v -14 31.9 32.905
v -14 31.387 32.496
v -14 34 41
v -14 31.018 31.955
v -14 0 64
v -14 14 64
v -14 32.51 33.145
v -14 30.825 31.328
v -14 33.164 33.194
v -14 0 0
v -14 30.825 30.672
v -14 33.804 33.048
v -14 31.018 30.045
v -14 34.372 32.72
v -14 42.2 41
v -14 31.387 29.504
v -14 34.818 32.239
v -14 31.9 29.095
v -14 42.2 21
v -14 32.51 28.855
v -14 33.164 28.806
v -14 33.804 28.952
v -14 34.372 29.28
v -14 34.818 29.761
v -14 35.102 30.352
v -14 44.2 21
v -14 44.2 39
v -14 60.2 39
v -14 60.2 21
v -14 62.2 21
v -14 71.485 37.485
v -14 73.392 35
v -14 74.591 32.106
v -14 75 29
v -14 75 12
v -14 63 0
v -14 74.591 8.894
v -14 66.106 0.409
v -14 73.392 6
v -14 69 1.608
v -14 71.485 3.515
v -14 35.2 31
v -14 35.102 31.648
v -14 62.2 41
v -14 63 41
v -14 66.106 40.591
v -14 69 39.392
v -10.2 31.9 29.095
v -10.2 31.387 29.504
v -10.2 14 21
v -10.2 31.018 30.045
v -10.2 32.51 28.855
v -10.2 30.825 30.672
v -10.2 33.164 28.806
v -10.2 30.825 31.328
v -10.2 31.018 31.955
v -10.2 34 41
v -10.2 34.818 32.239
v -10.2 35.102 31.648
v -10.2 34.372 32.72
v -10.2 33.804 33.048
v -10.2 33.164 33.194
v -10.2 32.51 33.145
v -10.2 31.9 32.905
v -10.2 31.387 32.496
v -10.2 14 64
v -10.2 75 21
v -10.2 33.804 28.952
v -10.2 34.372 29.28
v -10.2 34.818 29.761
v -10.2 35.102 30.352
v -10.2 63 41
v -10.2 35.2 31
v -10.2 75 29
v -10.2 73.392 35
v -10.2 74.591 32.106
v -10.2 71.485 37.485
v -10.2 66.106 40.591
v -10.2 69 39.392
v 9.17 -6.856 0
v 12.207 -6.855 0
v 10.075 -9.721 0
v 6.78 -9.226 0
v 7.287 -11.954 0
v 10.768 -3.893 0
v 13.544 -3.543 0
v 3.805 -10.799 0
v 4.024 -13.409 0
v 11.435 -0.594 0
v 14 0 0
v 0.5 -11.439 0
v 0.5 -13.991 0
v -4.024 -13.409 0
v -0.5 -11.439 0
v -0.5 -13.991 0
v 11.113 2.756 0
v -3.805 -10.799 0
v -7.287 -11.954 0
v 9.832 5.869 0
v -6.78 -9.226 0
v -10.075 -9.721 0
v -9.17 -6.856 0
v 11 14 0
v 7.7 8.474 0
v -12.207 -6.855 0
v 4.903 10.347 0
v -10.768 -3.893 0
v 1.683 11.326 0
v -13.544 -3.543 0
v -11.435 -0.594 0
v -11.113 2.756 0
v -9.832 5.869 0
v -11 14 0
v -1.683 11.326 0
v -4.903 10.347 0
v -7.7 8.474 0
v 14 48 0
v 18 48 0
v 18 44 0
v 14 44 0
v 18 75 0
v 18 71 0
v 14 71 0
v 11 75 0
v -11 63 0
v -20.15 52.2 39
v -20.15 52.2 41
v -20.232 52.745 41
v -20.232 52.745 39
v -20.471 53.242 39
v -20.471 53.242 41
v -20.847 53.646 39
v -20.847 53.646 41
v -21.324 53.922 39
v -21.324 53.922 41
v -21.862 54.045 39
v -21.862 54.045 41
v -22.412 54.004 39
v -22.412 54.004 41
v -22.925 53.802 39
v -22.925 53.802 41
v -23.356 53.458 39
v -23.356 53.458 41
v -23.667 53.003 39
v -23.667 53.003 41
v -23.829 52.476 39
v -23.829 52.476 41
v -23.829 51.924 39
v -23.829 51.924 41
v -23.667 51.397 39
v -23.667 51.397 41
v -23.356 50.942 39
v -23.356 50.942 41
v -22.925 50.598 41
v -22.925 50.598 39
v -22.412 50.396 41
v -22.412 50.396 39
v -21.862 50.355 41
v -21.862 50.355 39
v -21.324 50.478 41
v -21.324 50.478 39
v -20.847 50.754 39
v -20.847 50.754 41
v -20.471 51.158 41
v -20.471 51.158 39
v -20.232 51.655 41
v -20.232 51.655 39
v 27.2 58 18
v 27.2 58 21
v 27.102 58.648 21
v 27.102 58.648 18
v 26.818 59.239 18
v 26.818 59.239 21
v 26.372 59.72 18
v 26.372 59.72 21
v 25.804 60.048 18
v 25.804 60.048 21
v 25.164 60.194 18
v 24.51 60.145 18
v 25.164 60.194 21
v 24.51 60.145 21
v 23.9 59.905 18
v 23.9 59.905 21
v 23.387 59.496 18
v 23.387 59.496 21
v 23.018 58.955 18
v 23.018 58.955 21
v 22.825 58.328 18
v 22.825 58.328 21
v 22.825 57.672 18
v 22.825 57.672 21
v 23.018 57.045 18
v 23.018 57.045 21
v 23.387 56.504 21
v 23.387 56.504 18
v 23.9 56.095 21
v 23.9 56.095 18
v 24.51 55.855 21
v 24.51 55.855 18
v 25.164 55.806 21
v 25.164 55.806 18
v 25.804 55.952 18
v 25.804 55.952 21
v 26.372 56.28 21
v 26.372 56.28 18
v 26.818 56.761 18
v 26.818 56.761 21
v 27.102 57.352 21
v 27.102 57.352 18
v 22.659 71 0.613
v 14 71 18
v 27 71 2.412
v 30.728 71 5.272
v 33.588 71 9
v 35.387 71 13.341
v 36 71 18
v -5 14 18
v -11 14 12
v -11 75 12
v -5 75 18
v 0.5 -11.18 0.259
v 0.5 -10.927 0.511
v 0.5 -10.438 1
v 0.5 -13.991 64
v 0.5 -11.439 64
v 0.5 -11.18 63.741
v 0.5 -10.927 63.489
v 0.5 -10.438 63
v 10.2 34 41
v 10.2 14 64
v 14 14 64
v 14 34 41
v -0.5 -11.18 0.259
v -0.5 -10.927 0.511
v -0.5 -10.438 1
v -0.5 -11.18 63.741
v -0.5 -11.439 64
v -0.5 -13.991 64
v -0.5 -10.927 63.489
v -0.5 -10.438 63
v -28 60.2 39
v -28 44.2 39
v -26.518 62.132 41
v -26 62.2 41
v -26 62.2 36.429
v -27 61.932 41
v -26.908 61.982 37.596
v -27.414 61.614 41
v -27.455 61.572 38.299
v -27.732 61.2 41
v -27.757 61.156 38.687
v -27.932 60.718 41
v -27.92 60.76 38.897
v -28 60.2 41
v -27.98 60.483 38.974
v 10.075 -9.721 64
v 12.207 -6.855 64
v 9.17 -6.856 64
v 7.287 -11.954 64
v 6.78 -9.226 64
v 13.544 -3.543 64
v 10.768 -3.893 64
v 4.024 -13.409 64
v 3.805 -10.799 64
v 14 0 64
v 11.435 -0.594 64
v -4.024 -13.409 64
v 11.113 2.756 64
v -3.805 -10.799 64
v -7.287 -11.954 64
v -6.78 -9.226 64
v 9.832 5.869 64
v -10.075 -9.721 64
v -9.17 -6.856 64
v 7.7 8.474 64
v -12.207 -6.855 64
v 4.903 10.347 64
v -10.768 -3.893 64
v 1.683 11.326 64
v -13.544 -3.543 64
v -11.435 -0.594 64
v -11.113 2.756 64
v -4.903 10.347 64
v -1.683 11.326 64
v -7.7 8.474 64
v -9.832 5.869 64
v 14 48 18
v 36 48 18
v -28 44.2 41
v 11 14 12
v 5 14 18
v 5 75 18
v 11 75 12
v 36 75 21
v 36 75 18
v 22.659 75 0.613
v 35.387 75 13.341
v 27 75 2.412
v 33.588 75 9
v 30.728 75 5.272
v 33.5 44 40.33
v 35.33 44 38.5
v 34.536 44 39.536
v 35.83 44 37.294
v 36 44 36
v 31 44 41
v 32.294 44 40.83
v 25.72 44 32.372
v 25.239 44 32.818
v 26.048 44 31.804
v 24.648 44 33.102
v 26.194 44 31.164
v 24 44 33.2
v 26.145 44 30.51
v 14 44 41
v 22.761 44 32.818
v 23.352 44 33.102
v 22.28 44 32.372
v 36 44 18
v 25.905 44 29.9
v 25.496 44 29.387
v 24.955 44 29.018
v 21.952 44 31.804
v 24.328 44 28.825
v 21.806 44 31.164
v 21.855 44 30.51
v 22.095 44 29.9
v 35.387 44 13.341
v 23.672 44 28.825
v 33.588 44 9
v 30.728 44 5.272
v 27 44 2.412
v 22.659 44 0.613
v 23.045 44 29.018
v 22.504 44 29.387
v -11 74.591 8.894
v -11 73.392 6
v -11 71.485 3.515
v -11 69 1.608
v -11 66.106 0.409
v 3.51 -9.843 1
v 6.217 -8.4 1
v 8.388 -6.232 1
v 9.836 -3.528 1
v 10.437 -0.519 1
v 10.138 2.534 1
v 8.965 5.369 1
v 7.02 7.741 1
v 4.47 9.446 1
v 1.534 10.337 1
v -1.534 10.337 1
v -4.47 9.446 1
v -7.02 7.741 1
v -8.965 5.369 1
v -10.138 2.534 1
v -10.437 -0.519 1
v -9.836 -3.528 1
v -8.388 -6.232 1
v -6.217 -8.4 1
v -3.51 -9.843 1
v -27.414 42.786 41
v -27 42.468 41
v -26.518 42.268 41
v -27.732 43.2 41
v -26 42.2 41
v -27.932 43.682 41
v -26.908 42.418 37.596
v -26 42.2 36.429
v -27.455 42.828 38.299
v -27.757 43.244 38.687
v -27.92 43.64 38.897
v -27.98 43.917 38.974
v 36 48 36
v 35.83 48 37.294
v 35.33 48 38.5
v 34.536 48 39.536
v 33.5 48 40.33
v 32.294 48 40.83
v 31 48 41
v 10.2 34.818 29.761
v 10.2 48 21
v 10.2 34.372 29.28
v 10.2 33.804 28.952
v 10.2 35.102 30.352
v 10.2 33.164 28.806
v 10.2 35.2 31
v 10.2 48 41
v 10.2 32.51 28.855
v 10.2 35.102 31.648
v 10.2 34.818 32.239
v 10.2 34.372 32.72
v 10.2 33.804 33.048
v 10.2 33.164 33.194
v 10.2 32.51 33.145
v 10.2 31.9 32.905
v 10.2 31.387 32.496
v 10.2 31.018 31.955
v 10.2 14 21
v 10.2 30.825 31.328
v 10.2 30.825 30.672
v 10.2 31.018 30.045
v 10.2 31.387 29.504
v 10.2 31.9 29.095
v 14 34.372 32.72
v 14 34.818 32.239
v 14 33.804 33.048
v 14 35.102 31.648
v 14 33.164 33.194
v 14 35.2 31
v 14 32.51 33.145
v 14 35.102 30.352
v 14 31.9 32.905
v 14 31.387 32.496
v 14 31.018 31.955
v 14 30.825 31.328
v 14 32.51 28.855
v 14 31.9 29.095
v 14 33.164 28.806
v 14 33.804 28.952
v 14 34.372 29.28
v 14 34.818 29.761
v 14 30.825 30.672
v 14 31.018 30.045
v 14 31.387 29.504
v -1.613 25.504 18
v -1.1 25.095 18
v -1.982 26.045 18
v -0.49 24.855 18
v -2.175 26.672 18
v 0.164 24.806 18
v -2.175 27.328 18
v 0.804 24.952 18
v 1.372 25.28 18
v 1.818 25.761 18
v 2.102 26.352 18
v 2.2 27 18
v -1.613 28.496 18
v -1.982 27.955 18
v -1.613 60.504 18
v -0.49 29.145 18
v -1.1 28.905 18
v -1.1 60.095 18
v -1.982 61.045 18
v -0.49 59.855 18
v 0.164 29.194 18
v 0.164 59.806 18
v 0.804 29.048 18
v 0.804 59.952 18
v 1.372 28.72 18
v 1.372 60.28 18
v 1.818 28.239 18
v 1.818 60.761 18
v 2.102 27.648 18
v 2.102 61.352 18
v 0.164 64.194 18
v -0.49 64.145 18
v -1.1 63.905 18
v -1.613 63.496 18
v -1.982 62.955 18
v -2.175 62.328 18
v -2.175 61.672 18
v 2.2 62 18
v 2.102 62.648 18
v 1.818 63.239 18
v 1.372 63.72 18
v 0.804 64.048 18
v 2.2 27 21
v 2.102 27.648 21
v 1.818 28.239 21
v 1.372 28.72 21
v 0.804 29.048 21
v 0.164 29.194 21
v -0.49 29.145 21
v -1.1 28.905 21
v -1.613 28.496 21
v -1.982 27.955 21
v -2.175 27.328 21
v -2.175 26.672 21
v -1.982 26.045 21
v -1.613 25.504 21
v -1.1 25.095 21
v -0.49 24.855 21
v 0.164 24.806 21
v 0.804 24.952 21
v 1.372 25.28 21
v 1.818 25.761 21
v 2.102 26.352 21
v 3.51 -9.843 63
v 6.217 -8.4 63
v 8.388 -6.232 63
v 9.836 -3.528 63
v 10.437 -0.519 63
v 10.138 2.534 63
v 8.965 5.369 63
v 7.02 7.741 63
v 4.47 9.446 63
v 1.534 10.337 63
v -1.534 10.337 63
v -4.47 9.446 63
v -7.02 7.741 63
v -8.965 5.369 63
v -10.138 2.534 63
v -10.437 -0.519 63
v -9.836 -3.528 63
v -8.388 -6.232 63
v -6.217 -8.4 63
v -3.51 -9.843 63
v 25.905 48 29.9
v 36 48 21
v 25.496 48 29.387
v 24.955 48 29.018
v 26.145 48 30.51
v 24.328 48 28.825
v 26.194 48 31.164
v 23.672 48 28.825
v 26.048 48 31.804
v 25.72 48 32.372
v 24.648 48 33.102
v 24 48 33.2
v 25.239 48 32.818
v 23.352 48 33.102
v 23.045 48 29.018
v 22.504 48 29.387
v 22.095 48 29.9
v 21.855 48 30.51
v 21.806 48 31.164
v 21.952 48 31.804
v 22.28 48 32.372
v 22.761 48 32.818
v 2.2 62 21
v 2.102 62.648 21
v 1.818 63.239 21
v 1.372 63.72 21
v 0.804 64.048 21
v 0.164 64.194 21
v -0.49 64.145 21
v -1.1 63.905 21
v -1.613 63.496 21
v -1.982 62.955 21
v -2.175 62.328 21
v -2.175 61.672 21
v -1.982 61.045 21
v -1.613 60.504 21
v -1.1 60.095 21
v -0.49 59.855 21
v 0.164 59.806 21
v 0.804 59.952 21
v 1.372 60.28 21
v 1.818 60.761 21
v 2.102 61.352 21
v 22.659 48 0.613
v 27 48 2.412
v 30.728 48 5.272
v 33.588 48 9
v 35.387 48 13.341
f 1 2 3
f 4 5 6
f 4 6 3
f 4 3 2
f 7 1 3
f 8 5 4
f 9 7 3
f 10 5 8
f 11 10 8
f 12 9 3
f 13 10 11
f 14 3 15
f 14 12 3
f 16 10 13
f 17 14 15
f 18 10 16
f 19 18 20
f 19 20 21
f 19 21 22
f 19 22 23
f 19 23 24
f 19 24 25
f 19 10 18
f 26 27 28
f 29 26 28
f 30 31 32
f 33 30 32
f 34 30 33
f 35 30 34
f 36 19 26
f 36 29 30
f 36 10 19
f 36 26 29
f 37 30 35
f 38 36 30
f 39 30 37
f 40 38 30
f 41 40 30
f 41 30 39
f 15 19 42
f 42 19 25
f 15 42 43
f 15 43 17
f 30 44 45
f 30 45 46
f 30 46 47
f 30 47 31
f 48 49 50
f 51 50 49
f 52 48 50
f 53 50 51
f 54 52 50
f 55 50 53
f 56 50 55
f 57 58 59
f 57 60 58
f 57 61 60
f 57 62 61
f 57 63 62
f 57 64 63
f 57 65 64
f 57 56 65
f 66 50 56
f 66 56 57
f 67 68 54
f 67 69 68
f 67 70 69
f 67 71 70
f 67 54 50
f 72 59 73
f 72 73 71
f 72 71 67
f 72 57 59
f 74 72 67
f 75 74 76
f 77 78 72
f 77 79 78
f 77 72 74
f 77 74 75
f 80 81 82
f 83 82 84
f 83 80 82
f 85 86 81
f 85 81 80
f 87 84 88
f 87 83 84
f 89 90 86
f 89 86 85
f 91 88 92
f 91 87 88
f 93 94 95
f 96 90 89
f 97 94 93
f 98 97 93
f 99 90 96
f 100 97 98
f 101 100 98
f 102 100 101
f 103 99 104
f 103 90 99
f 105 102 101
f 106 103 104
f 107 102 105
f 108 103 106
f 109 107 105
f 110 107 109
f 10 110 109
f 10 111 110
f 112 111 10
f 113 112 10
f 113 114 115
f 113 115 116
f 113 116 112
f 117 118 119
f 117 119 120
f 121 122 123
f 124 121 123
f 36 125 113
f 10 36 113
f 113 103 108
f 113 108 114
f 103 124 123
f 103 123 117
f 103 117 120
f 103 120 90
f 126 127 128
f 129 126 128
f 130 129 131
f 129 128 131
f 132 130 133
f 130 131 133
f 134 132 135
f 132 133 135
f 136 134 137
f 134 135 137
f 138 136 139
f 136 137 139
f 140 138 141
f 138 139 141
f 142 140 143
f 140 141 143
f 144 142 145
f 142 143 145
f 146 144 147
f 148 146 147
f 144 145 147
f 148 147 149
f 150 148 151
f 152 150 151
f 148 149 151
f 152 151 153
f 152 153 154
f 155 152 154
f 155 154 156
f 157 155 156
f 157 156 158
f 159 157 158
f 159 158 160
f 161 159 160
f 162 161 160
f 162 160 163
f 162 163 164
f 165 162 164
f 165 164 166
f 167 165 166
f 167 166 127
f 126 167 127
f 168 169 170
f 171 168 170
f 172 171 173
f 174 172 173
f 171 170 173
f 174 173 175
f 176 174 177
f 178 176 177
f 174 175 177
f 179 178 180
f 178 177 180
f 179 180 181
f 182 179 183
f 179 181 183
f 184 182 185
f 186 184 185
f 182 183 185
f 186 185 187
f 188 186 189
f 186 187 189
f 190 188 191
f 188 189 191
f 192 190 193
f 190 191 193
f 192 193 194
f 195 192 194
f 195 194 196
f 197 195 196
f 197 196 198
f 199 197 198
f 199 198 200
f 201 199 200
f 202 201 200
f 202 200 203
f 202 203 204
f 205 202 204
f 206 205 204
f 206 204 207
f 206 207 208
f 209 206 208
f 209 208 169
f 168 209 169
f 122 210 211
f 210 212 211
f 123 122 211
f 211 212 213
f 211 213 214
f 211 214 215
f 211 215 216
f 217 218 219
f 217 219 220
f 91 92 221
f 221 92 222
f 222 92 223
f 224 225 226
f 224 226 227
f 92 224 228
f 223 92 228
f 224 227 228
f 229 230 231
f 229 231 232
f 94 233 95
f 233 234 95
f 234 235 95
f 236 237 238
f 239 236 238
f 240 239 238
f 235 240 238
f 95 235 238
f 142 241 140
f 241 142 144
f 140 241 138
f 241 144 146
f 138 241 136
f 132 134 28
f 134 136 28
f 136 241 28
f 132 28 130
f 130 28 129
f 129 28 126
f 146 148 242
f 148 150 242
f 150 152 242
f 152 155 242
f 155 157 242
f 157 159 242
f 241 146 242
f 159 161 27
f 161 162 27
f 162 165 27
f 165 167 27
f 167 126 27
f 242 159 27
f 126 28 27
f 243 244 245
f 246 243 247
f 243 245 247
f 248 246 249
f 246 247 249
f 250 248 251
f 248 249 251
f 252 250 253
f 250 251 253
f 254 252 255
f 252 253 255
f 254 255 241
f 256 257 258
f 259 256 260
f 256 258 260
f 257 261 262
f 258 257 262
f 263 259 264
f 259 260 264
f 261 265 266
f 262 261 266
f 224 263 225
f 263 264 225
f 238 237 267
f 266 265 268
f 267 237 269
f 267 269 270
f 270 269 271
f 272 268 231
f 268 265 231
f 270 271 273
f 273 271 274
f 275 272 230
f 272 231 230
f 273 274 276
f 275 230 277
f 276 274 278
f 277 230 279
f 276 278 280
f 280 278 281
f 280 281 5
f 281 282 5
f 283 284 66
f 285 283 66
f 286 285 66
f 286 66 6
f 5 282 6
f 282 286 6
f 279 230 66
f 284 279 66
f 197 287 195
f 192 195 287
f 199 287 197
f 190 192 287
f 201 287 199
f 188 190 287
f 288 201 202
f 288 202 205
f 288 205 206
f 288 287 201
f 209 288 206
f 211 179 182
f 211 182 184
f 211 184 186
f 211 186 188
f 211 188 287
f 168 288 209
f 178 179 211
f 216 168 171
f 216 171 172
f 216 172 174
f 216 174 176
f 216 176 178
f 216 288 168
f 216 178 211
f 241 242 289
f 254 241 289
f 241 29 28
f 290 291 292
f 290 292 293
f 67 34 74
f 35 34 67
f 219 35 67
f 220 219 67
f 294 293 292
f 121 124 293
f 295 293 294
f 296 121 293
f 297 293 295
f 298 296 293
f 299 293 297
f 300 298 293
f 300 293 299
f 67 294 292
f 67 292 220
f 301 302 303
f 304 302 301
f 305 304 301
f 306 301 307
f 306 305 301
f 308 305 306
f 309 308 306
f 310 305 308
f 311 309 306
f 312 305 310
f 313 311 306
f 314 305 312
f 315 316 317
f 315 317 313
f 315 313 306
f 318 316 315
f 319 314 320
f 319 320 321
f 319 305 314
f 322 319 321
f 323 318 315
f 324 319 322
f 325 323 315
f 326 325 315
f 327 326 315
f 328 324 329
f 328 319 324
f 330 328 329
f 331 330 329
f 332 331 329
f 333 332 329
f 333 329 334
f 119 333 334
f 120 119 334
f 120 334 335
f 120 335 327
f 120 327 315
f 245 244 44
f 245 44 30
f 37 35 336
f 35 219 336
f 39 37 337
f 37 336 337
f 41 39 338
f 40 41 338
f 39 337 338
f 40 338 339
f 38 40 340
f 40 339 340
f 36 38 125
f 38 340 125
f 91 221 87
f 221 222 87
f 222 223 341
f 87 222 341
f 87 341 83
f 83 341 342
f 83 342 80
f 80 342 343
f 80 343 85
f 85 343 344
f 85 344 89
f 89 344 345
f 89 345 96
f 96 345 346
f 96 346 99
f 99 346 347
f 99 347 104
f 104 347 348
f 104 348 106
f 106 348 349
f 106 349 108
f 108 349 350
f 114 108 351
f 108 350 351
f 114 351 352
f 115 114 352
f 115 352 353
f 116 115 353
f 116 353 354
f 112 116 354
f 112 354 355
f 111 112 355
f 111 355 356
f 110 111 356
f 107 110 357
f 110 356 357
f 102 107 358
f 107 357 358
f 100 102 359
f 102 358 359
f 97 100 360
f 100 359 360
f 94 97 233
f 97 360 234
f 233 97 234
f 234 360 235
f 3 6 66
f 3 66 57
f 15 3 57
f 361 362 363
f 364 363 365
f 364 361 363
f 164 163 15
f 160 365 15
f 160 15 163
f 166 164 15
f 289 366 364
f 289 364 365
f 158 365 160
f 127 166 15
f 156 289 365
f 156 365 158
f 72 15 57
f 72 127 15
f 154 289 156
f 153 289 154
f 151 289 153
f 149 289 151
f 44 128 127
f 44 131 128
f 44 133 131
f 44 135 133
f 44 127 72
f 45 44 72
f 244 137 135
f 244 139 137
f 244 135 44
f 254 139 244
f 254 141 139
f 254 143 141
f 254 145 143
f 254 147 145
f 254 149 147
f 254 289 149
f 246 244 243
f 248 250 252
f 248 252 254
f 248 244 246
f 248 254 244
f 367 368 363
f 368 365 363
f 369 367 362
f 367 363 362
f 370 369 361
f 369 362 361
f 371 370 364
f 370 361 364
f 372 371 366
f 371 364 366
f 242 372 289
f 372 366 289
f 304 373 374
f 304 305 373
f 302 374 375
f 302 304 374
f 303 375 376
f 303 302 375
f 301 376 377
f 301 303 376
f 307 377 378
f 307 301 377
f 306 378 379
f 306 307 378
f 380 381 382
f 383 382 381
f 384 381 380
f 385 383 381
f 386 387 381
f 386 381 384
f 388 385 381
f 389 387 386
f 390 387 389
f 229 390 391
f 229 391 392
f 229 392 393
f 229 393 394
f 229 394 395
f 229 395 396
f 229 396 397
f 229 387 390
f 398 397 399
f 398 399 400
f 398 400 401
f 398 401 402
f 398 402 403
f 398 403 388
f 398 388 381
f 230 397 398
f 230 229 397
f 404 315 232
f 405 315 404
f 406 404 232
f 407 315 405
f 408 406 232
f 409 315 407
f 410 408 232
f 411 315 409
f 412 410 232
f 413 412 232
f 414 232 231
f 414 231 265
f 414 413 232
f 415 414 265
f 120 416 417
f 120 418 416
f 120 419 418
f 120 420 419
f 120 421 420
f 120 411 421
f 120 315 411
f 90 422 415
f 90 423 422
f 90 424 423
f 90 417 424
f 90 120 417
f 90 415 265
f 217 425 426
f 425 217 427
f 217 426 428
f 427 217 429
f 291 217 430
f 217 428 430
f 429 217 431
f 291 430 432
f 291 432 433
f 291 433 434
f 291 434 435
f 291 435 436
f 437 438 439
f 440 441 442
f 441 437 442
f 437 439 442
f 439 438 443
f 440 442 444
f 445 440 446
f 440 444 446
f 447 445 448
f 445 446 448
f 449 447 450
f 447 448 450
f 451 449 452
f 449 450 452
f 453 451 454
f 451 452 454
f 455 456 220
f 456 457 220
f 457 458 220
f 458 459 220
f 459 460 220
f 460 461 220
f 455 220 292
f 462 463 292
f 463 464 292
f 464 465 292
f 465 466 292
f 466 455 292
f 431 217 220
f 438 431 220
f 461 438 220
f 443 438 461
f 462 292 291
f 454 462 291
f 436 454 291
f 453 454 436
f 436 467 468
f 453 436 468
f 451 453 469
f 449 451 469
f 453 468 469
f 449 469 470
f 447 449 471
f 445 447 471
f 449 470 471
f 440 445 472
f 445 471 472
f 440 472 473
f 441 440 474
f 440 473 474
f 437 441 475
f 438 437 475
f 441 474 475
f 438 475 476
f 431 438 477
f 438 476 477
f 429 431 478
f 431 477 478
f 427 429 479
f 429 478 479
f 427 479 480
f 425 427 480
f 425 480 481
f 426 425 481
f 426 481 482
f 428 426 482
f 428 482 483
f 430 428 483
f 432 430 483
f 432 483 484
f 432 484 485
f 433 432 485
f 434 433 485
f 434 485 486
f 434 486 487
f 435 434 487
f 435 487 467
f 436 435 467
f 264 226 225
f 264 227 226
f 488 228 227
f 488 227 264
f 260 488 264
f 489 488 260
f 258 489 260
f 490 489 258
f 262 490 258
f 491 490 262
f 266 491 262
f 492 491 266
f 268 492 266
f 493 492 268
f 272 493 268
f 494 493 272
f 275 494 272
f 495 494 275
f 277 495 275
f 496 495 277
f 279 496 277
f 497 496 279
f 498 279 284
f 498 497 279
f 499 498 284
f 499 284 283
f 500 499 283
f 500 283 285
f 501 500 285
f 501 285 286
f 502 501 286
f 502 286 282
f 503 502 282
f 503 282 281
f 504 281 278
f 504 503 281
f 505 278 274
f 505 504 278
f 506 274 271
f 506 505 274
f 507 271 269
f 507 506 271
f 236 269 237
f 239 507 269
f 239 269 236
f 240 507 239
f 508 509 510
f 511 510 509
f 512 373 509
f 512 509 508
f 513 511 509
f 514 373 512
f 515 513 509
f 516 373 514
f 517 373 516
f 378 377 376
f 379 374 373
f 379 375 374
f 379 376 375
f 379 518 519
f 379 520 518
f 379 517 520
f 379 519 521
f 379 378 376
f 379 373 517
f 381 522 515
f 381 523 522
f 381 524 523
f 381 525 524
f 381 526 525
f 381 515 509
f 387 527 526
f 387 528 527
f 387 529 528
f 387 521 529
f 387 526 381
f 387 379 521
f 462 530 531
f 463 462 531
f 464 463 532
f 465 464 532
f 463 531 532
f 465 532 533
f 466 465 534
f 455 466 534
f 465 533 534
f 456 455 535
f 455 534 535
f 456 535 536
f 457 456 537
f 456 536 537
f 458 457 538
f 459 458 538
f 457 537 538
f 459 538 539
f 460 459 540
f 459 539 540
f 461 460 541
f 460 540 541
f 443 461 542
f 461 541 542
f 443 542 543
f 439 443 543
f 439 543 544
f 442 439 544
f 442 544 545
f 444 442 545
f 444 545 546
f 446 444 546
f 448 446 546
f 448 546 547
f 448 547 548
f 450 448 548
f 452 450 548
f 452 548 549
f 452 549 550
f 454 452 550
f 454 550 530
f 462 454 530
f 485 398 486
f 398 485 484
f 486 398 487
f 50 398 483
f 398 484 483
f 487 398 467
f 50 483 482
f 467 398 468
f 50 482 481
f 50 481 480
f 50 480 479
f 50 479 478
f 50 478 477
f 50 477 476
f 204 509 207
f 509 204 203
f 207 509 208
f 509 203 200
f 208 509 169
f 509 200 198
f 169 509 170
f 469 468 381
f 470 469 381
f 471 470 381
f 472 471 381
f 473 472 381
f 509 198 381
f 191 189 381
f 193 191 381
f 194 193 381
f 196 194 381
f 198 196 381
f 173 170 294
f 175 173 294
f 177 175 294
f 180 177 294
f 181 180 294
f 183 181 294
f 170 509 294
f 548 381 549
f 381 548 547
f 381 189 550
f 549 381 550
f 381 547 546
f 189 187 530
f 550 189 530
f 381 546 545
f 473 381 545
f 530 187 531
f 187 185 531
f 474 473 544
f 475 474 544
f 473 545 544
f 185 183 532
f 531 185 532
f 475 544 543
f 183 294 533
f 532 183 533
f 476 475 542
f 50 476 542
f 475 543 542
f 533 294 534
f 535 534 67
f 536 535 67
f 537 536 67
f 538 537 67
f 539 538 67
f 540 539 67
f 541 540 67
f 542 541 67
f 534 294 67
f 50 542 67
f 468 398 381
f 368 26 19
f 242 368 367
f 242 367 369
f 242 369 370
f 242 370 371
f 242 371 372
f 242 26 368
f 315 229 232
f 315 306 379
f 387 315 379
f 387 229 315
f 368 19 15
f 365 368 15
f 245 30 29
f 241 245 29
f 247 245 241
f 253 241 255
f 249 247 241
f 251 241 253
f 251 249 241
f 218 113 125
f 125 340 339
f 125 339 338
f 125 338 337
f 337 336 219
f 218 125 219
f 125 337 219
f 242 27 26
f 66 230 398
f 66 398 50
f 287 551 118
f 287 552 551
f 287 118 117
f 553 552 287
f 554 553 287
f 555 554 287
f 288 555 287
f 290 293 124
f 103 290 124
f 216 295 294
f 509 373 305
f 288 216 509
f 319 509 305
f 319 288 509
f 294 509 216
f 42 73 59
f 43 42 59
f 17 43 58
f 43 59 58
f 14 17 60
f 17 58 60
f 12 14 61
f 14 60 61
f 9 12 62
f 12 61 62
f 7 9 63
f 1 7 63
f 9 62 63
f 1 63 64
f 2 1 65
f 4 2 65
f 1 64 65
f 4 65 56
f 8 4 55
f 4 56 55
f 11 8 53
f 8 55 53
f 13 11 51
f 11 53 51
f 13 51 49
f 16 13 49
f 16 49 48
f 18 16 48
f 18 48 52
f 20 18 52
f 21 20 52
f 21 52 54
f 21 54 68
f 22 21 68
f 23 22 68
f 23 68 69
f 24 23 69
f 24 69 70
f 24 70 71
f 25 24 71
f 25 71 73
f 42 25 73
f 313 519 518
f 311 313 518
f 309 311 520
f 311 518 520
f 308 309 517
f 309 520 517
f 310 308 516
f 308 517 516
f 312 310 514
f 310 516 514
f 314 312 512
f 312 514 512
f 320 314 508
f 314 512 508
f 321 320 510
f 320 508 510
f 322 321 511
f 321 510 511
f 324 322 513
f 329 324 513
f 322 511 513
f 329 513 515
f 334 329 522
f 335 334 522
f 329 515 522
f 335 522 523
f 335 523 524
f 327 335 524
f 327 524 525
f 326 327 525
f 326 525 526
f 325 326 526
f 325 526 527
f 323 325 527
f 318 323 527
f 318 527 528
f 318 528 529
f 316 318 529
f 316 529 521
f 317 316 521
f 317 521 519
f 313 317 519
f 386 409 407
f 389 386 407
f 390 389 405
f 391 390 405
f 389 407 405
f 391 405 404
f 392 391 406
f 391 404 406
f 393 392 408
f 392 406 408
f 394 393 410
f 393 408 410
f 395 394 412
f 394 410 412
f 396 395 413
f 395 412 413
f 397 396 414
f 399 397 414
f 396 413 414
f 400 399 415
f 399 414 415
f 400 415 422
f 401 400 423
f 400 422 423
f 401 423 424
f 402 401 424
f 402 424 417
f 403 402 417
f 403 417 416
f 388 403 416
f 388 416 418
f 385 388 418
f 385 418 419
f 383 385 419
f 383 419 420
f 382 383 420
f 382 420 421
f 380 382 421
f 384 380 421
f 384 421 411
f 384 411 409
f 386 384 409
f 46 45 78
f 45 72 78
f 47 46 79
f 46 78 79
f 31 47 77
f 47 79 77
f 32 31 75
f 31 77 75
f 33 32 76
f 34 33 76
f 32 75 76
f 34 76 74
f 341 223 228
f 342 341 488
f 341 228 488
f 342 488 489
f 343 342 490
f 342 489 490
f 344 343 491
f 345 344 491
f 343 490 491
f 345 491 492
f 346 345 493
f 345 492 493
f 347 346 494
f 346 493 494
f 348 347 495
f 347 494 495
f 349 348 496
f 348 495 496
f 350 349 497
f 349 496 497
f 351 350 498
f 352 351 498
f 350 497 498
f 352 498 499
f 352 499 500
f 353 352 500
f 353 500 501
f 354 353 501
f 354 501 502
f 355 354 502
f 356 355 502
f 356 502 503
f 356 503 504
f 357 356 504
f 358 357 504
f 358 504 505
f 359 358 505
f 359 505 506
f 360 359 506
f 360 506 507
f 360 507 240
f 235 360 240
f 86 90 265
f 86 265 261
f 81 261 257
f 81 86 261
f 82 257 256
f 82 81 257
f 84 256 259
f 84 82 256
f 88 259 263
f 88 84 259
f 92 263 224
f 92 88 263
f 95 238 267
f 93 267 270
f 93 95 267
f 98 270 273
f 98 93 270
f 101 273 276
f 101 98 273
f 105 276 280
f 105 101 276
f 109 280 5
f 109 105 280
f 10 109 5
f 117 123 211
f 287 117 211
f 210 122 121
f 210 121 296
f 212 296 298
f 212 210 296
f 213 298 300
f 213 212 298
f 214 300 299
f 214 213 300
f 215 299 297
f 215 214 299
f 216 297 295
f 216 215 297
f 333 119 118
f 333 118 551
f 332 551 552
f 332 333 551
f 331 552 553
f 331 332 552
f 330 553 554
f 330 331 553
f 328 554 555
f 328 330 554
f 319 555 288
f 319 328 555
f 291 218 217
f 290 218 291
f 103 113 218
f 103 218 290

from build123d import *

# Parameters (mm, degrees)
BOSS_EXTRUDE1_DEPTH     = 64
CUT_EXTRUDE1_DEPTH      = 61
CUT_EXTRUDE2_DEPTH      = 103.493902258
CUT_EXTRUDE2_DEPTH_BACK = 103.493902258
CUT_EXTRUDE3_DEPTH      = 43
CUT_EXTRUDE4_DEPTH      = 105.961897849
CHAMFER1_SIZE           = 1
SKETCH6_R               = 2.2
CUT_EXTRUDE5_DEPTH      = 94.648278148
BOSS_EXTRUDE2_DEPTH     = 14
CUT_EXTRUDE6_DEPTH      = 106.81625079
SKETCH9_R               = 1.85
CUT_EXTRUDE7_DEPTH      = 93.746967605
FILLET1_R               = 2
FILLET2_R               = 12
SKETCH10_R              = 2.2
CUT_EXTRUDE8_DEPTH      = 108.168092266
FILLET3_R               = 5
FILLET4_START           = 44
FILLET4_DEPTH           = 31
SKETCH11_R              = 2.2
CUT_EXTRUDE9_DEPTH      = 97.098348533
SKETCH12_W              = 18
SKETCH12_H              = 23
CUT_EXTRUDE10_DEPTH     = 22


with BuildPart() as part:
    # Sketch1 → Boss-Extrude1 (new body)
    with BuildSketch(Plane.XY):
        with BuildLine():
            Line((-14, 0), (-14, 75))
            Line((-14, 75), (36, 75))
            Line((36, 75), (36, 44))
            Line((36, 44), (14, 44))
            Line((14, 44), (14, 0))
            ThreePointArc((14, 0), (0, -14), (-14, 0))
        make_face()
    extrude(amount=BOSS_EXTRUDE1_DEPTH)

    # Sketch2 → Cut-Extrude1 (cut)
    with BuildSketch(Plane(origin=(0, 75, 0), x_dir=(1, 0, 0), z_dir=(0, 1, 0))):
        Polygon((-11, 0), (-11, -12), (-5, -18), (5, -18), (11, -12), (11, 0), align=None)
    extrude(amount=-CUT_EXTRUDE1_DEPTH, mode=Mode.SUBTRACT)

    # Sketch3 → Cut-Extrude2 (cut, two sides: drawn at the far end of the back side and taken through both)
    with BuildSketch(Plane(origin=(14, 0, 0), x_dir=(0, 0, -1), z_dir=(1, 0, 0)).offset(-CUT_EXTRUDE2_DEPTH_BACK)):
        Polygon((-64, 14), (-41, 34), (-41, 75), (-64, 75), align=None)
    extrude(amount=CUT_EXTRUDE2_DEPTH + CUT_EXTRUDE2_DEPTH_BACK, mode=Mode.SUBTRACT)

    # Sketch4 → Cut-Extrude3 (cut)
    with BuildSketch(Plane.XY.offset(64)):
        Polygon((-10.2, 14), (-10.2, 75), (36, 75), (36, 48), (10.2, 48), (10.2, 14), align=None)
    extrude(amount=-CUT_EXTRUDE3_DEPTH, mode=Mode.SUBTRACT)

    # Sketch5 → Cut-Extrude4 (cut, through all)
    with BuildSketch(Plane.XY.offset(64)):
        with BuildLine():
            Line((-0.5, -10.438031424), (-0.5, -13.99106858))
            ThreePointArc((-0.5, -13.99106858), (0, -14), (0.5, -13.99106858))
            Line((0.5, -13.99106858), (0.5, -10.438031424))
            ThreePointArc((0.5, -10.438031424), (0, 10.45), (-0.5, -10.438031424))
        make_face()
    extrude(amount=-CUT_EXTRUDE4_DEPTH, mode=Mode.SUBTRACT)

    # Chamfer1
    chamfer1_edges = [part.edges().sort_by_distance(p)[0] for p in [
        (0, 10.45, 0),
        (0, 10.45, 64),
    ]]
    chamfer(chamfer1_edges, length=CHAMFER1_SIZE)

    # Sketch6 → Cut-Extrude5 (cut, through all)
    with BuildSketch(Plane.XY.offset(21)):
        with Locations((0, 62)):
            Circle(SKETCH6_R)
        with Locations((0, 27)):
            Circle(SKETCH6_R)
        with Locations((25, 58)):
            Circle(SKETCH6_R)
    extrude(amount=-CUT_EXTRUDE5_DEPTH, mode=Mode.SUBTRACT)

    # Sketch7 → Boss-Extrude2 (add)
    with BuildSketch(Plane(origin=(-14, 0, 0), x_dir=(0, 0, -1), z_dir=(1, 0, 0))):
        Polygon((-41, 62.2), (-21, 62.2), (-21, 60.2), (-39, 60.2), (-39, 44.2), (-21, 44.2), (-21, 42.2), (-41, 42.2), align=None)
    extrude(amount=-BOSS_EXTRUDE2_DEPTH)

    # Sketch8 → Cut-Extrude6 (cut, through all)
    with BuildSketch(Plane(origin=(0, 62.2, 0), x_dir=(1, 0, 0), z_dir=(0, 1, 0))):
        Polygon((-14, -21), (-28, -39), (-28, -21), align=None)
    extrude(amount=-CUT_EXTRUDE6_DEPTH, mode=Mode.SUBTRACT)

    # Sketch9 → Cut-Extrude7 (cut, through all)
    with BuildSketch(Plane.XY.offset(41)):
        with Locations((-22, 52.2)):
            Circle(SKETCH9_R)
    extrude(amount=-CUT_EXTRUDE7_DEPTH, mode=Mode.SUBTRACT)

    # Fillet1
    fillet1_edges = [part.edges().sort_by_distance(p)[0] for p in [
        (-28, 42.2, 40),
        (-28, 62.2, 40),
    ]]
    fillet(fillet1_edges, radius=FILLET1_R)

    # Fillet2
    fillet2_edges = [part.edges().sort_by_distance(p)[0] for p in [
        (-12.1, 75, 41),
        (-12.5, 75, 0),
    ]]
    fillet(fillet2_edges, radius=FILLET2_R)

    # Sketch10 → Cut-Extrude8 (cut, through all)
    with BuildSketch(Plane(origin=(14, 0, 0), x_dir=(0, 0, -1), z_dir=(1, 0, 0))):
        with Locations(Location((-31, 33, 0), (0, 0, 90))):
            Circle(SKETCH10_R)
    extrude(amount=-CUT_EXTRUDE8_DEPTH, mode=Mode.SUBTRACT)

    # Fillet3
    fillet3_edges = [part.edges().sort_by_distance(p)[0] for p in [
        (36, 46, 41),
    ]]
    fillet(fillet3_edges, radius=FILLET3_R)

    # Fillet4: read off the stored shape, not the designer's step
    # Fillet4 outline → Fillet4 (cut)
    with BuildSketch(Plane(origin=(0, 0, 0), x_dir=(1, 0, 0), z_dir=(0, 1, 0)).offset(FILLET4_START)):
        with BuildLine():
            ThreePointArc((18, 0), (30.727922061, -5.272077939), (36, -18))
            Line((36, -18), (36, 0))
            Line((36, 0), (18, 0))
        make_face()
    extrude(amount=FILLET4_DEPTH, mode=Mode.SUBTRACT)

    # Sketch11 → Cut-Extrude9 (cut, through all)
    with BuildSketch(Plane(origin=(0, 48, 0), x_dir=(1, 0, 0), z_dir=(0, 1, 0))):
        with Locations(Location((24, -31, 0), (0, 0, 270))):
            Circle(SKETCH11_R)
    extrude(amount=-CUT_EXTRUDE9_DEPTH, mode=Mode.SUBTRACT)

    # Sketch12 → Cut-Extrude10 (cut)
    with BuildSketch(Plane.ZY.offset(-36)):
        with Locations((9, 59.5)):
            Rectangle(SKETCH12_W, SKETCH12_H)
    extrude(amount=CUT_EXTRUDE10_DEPTH, mode=Mode.SUBTRACT)


solid = part.part
